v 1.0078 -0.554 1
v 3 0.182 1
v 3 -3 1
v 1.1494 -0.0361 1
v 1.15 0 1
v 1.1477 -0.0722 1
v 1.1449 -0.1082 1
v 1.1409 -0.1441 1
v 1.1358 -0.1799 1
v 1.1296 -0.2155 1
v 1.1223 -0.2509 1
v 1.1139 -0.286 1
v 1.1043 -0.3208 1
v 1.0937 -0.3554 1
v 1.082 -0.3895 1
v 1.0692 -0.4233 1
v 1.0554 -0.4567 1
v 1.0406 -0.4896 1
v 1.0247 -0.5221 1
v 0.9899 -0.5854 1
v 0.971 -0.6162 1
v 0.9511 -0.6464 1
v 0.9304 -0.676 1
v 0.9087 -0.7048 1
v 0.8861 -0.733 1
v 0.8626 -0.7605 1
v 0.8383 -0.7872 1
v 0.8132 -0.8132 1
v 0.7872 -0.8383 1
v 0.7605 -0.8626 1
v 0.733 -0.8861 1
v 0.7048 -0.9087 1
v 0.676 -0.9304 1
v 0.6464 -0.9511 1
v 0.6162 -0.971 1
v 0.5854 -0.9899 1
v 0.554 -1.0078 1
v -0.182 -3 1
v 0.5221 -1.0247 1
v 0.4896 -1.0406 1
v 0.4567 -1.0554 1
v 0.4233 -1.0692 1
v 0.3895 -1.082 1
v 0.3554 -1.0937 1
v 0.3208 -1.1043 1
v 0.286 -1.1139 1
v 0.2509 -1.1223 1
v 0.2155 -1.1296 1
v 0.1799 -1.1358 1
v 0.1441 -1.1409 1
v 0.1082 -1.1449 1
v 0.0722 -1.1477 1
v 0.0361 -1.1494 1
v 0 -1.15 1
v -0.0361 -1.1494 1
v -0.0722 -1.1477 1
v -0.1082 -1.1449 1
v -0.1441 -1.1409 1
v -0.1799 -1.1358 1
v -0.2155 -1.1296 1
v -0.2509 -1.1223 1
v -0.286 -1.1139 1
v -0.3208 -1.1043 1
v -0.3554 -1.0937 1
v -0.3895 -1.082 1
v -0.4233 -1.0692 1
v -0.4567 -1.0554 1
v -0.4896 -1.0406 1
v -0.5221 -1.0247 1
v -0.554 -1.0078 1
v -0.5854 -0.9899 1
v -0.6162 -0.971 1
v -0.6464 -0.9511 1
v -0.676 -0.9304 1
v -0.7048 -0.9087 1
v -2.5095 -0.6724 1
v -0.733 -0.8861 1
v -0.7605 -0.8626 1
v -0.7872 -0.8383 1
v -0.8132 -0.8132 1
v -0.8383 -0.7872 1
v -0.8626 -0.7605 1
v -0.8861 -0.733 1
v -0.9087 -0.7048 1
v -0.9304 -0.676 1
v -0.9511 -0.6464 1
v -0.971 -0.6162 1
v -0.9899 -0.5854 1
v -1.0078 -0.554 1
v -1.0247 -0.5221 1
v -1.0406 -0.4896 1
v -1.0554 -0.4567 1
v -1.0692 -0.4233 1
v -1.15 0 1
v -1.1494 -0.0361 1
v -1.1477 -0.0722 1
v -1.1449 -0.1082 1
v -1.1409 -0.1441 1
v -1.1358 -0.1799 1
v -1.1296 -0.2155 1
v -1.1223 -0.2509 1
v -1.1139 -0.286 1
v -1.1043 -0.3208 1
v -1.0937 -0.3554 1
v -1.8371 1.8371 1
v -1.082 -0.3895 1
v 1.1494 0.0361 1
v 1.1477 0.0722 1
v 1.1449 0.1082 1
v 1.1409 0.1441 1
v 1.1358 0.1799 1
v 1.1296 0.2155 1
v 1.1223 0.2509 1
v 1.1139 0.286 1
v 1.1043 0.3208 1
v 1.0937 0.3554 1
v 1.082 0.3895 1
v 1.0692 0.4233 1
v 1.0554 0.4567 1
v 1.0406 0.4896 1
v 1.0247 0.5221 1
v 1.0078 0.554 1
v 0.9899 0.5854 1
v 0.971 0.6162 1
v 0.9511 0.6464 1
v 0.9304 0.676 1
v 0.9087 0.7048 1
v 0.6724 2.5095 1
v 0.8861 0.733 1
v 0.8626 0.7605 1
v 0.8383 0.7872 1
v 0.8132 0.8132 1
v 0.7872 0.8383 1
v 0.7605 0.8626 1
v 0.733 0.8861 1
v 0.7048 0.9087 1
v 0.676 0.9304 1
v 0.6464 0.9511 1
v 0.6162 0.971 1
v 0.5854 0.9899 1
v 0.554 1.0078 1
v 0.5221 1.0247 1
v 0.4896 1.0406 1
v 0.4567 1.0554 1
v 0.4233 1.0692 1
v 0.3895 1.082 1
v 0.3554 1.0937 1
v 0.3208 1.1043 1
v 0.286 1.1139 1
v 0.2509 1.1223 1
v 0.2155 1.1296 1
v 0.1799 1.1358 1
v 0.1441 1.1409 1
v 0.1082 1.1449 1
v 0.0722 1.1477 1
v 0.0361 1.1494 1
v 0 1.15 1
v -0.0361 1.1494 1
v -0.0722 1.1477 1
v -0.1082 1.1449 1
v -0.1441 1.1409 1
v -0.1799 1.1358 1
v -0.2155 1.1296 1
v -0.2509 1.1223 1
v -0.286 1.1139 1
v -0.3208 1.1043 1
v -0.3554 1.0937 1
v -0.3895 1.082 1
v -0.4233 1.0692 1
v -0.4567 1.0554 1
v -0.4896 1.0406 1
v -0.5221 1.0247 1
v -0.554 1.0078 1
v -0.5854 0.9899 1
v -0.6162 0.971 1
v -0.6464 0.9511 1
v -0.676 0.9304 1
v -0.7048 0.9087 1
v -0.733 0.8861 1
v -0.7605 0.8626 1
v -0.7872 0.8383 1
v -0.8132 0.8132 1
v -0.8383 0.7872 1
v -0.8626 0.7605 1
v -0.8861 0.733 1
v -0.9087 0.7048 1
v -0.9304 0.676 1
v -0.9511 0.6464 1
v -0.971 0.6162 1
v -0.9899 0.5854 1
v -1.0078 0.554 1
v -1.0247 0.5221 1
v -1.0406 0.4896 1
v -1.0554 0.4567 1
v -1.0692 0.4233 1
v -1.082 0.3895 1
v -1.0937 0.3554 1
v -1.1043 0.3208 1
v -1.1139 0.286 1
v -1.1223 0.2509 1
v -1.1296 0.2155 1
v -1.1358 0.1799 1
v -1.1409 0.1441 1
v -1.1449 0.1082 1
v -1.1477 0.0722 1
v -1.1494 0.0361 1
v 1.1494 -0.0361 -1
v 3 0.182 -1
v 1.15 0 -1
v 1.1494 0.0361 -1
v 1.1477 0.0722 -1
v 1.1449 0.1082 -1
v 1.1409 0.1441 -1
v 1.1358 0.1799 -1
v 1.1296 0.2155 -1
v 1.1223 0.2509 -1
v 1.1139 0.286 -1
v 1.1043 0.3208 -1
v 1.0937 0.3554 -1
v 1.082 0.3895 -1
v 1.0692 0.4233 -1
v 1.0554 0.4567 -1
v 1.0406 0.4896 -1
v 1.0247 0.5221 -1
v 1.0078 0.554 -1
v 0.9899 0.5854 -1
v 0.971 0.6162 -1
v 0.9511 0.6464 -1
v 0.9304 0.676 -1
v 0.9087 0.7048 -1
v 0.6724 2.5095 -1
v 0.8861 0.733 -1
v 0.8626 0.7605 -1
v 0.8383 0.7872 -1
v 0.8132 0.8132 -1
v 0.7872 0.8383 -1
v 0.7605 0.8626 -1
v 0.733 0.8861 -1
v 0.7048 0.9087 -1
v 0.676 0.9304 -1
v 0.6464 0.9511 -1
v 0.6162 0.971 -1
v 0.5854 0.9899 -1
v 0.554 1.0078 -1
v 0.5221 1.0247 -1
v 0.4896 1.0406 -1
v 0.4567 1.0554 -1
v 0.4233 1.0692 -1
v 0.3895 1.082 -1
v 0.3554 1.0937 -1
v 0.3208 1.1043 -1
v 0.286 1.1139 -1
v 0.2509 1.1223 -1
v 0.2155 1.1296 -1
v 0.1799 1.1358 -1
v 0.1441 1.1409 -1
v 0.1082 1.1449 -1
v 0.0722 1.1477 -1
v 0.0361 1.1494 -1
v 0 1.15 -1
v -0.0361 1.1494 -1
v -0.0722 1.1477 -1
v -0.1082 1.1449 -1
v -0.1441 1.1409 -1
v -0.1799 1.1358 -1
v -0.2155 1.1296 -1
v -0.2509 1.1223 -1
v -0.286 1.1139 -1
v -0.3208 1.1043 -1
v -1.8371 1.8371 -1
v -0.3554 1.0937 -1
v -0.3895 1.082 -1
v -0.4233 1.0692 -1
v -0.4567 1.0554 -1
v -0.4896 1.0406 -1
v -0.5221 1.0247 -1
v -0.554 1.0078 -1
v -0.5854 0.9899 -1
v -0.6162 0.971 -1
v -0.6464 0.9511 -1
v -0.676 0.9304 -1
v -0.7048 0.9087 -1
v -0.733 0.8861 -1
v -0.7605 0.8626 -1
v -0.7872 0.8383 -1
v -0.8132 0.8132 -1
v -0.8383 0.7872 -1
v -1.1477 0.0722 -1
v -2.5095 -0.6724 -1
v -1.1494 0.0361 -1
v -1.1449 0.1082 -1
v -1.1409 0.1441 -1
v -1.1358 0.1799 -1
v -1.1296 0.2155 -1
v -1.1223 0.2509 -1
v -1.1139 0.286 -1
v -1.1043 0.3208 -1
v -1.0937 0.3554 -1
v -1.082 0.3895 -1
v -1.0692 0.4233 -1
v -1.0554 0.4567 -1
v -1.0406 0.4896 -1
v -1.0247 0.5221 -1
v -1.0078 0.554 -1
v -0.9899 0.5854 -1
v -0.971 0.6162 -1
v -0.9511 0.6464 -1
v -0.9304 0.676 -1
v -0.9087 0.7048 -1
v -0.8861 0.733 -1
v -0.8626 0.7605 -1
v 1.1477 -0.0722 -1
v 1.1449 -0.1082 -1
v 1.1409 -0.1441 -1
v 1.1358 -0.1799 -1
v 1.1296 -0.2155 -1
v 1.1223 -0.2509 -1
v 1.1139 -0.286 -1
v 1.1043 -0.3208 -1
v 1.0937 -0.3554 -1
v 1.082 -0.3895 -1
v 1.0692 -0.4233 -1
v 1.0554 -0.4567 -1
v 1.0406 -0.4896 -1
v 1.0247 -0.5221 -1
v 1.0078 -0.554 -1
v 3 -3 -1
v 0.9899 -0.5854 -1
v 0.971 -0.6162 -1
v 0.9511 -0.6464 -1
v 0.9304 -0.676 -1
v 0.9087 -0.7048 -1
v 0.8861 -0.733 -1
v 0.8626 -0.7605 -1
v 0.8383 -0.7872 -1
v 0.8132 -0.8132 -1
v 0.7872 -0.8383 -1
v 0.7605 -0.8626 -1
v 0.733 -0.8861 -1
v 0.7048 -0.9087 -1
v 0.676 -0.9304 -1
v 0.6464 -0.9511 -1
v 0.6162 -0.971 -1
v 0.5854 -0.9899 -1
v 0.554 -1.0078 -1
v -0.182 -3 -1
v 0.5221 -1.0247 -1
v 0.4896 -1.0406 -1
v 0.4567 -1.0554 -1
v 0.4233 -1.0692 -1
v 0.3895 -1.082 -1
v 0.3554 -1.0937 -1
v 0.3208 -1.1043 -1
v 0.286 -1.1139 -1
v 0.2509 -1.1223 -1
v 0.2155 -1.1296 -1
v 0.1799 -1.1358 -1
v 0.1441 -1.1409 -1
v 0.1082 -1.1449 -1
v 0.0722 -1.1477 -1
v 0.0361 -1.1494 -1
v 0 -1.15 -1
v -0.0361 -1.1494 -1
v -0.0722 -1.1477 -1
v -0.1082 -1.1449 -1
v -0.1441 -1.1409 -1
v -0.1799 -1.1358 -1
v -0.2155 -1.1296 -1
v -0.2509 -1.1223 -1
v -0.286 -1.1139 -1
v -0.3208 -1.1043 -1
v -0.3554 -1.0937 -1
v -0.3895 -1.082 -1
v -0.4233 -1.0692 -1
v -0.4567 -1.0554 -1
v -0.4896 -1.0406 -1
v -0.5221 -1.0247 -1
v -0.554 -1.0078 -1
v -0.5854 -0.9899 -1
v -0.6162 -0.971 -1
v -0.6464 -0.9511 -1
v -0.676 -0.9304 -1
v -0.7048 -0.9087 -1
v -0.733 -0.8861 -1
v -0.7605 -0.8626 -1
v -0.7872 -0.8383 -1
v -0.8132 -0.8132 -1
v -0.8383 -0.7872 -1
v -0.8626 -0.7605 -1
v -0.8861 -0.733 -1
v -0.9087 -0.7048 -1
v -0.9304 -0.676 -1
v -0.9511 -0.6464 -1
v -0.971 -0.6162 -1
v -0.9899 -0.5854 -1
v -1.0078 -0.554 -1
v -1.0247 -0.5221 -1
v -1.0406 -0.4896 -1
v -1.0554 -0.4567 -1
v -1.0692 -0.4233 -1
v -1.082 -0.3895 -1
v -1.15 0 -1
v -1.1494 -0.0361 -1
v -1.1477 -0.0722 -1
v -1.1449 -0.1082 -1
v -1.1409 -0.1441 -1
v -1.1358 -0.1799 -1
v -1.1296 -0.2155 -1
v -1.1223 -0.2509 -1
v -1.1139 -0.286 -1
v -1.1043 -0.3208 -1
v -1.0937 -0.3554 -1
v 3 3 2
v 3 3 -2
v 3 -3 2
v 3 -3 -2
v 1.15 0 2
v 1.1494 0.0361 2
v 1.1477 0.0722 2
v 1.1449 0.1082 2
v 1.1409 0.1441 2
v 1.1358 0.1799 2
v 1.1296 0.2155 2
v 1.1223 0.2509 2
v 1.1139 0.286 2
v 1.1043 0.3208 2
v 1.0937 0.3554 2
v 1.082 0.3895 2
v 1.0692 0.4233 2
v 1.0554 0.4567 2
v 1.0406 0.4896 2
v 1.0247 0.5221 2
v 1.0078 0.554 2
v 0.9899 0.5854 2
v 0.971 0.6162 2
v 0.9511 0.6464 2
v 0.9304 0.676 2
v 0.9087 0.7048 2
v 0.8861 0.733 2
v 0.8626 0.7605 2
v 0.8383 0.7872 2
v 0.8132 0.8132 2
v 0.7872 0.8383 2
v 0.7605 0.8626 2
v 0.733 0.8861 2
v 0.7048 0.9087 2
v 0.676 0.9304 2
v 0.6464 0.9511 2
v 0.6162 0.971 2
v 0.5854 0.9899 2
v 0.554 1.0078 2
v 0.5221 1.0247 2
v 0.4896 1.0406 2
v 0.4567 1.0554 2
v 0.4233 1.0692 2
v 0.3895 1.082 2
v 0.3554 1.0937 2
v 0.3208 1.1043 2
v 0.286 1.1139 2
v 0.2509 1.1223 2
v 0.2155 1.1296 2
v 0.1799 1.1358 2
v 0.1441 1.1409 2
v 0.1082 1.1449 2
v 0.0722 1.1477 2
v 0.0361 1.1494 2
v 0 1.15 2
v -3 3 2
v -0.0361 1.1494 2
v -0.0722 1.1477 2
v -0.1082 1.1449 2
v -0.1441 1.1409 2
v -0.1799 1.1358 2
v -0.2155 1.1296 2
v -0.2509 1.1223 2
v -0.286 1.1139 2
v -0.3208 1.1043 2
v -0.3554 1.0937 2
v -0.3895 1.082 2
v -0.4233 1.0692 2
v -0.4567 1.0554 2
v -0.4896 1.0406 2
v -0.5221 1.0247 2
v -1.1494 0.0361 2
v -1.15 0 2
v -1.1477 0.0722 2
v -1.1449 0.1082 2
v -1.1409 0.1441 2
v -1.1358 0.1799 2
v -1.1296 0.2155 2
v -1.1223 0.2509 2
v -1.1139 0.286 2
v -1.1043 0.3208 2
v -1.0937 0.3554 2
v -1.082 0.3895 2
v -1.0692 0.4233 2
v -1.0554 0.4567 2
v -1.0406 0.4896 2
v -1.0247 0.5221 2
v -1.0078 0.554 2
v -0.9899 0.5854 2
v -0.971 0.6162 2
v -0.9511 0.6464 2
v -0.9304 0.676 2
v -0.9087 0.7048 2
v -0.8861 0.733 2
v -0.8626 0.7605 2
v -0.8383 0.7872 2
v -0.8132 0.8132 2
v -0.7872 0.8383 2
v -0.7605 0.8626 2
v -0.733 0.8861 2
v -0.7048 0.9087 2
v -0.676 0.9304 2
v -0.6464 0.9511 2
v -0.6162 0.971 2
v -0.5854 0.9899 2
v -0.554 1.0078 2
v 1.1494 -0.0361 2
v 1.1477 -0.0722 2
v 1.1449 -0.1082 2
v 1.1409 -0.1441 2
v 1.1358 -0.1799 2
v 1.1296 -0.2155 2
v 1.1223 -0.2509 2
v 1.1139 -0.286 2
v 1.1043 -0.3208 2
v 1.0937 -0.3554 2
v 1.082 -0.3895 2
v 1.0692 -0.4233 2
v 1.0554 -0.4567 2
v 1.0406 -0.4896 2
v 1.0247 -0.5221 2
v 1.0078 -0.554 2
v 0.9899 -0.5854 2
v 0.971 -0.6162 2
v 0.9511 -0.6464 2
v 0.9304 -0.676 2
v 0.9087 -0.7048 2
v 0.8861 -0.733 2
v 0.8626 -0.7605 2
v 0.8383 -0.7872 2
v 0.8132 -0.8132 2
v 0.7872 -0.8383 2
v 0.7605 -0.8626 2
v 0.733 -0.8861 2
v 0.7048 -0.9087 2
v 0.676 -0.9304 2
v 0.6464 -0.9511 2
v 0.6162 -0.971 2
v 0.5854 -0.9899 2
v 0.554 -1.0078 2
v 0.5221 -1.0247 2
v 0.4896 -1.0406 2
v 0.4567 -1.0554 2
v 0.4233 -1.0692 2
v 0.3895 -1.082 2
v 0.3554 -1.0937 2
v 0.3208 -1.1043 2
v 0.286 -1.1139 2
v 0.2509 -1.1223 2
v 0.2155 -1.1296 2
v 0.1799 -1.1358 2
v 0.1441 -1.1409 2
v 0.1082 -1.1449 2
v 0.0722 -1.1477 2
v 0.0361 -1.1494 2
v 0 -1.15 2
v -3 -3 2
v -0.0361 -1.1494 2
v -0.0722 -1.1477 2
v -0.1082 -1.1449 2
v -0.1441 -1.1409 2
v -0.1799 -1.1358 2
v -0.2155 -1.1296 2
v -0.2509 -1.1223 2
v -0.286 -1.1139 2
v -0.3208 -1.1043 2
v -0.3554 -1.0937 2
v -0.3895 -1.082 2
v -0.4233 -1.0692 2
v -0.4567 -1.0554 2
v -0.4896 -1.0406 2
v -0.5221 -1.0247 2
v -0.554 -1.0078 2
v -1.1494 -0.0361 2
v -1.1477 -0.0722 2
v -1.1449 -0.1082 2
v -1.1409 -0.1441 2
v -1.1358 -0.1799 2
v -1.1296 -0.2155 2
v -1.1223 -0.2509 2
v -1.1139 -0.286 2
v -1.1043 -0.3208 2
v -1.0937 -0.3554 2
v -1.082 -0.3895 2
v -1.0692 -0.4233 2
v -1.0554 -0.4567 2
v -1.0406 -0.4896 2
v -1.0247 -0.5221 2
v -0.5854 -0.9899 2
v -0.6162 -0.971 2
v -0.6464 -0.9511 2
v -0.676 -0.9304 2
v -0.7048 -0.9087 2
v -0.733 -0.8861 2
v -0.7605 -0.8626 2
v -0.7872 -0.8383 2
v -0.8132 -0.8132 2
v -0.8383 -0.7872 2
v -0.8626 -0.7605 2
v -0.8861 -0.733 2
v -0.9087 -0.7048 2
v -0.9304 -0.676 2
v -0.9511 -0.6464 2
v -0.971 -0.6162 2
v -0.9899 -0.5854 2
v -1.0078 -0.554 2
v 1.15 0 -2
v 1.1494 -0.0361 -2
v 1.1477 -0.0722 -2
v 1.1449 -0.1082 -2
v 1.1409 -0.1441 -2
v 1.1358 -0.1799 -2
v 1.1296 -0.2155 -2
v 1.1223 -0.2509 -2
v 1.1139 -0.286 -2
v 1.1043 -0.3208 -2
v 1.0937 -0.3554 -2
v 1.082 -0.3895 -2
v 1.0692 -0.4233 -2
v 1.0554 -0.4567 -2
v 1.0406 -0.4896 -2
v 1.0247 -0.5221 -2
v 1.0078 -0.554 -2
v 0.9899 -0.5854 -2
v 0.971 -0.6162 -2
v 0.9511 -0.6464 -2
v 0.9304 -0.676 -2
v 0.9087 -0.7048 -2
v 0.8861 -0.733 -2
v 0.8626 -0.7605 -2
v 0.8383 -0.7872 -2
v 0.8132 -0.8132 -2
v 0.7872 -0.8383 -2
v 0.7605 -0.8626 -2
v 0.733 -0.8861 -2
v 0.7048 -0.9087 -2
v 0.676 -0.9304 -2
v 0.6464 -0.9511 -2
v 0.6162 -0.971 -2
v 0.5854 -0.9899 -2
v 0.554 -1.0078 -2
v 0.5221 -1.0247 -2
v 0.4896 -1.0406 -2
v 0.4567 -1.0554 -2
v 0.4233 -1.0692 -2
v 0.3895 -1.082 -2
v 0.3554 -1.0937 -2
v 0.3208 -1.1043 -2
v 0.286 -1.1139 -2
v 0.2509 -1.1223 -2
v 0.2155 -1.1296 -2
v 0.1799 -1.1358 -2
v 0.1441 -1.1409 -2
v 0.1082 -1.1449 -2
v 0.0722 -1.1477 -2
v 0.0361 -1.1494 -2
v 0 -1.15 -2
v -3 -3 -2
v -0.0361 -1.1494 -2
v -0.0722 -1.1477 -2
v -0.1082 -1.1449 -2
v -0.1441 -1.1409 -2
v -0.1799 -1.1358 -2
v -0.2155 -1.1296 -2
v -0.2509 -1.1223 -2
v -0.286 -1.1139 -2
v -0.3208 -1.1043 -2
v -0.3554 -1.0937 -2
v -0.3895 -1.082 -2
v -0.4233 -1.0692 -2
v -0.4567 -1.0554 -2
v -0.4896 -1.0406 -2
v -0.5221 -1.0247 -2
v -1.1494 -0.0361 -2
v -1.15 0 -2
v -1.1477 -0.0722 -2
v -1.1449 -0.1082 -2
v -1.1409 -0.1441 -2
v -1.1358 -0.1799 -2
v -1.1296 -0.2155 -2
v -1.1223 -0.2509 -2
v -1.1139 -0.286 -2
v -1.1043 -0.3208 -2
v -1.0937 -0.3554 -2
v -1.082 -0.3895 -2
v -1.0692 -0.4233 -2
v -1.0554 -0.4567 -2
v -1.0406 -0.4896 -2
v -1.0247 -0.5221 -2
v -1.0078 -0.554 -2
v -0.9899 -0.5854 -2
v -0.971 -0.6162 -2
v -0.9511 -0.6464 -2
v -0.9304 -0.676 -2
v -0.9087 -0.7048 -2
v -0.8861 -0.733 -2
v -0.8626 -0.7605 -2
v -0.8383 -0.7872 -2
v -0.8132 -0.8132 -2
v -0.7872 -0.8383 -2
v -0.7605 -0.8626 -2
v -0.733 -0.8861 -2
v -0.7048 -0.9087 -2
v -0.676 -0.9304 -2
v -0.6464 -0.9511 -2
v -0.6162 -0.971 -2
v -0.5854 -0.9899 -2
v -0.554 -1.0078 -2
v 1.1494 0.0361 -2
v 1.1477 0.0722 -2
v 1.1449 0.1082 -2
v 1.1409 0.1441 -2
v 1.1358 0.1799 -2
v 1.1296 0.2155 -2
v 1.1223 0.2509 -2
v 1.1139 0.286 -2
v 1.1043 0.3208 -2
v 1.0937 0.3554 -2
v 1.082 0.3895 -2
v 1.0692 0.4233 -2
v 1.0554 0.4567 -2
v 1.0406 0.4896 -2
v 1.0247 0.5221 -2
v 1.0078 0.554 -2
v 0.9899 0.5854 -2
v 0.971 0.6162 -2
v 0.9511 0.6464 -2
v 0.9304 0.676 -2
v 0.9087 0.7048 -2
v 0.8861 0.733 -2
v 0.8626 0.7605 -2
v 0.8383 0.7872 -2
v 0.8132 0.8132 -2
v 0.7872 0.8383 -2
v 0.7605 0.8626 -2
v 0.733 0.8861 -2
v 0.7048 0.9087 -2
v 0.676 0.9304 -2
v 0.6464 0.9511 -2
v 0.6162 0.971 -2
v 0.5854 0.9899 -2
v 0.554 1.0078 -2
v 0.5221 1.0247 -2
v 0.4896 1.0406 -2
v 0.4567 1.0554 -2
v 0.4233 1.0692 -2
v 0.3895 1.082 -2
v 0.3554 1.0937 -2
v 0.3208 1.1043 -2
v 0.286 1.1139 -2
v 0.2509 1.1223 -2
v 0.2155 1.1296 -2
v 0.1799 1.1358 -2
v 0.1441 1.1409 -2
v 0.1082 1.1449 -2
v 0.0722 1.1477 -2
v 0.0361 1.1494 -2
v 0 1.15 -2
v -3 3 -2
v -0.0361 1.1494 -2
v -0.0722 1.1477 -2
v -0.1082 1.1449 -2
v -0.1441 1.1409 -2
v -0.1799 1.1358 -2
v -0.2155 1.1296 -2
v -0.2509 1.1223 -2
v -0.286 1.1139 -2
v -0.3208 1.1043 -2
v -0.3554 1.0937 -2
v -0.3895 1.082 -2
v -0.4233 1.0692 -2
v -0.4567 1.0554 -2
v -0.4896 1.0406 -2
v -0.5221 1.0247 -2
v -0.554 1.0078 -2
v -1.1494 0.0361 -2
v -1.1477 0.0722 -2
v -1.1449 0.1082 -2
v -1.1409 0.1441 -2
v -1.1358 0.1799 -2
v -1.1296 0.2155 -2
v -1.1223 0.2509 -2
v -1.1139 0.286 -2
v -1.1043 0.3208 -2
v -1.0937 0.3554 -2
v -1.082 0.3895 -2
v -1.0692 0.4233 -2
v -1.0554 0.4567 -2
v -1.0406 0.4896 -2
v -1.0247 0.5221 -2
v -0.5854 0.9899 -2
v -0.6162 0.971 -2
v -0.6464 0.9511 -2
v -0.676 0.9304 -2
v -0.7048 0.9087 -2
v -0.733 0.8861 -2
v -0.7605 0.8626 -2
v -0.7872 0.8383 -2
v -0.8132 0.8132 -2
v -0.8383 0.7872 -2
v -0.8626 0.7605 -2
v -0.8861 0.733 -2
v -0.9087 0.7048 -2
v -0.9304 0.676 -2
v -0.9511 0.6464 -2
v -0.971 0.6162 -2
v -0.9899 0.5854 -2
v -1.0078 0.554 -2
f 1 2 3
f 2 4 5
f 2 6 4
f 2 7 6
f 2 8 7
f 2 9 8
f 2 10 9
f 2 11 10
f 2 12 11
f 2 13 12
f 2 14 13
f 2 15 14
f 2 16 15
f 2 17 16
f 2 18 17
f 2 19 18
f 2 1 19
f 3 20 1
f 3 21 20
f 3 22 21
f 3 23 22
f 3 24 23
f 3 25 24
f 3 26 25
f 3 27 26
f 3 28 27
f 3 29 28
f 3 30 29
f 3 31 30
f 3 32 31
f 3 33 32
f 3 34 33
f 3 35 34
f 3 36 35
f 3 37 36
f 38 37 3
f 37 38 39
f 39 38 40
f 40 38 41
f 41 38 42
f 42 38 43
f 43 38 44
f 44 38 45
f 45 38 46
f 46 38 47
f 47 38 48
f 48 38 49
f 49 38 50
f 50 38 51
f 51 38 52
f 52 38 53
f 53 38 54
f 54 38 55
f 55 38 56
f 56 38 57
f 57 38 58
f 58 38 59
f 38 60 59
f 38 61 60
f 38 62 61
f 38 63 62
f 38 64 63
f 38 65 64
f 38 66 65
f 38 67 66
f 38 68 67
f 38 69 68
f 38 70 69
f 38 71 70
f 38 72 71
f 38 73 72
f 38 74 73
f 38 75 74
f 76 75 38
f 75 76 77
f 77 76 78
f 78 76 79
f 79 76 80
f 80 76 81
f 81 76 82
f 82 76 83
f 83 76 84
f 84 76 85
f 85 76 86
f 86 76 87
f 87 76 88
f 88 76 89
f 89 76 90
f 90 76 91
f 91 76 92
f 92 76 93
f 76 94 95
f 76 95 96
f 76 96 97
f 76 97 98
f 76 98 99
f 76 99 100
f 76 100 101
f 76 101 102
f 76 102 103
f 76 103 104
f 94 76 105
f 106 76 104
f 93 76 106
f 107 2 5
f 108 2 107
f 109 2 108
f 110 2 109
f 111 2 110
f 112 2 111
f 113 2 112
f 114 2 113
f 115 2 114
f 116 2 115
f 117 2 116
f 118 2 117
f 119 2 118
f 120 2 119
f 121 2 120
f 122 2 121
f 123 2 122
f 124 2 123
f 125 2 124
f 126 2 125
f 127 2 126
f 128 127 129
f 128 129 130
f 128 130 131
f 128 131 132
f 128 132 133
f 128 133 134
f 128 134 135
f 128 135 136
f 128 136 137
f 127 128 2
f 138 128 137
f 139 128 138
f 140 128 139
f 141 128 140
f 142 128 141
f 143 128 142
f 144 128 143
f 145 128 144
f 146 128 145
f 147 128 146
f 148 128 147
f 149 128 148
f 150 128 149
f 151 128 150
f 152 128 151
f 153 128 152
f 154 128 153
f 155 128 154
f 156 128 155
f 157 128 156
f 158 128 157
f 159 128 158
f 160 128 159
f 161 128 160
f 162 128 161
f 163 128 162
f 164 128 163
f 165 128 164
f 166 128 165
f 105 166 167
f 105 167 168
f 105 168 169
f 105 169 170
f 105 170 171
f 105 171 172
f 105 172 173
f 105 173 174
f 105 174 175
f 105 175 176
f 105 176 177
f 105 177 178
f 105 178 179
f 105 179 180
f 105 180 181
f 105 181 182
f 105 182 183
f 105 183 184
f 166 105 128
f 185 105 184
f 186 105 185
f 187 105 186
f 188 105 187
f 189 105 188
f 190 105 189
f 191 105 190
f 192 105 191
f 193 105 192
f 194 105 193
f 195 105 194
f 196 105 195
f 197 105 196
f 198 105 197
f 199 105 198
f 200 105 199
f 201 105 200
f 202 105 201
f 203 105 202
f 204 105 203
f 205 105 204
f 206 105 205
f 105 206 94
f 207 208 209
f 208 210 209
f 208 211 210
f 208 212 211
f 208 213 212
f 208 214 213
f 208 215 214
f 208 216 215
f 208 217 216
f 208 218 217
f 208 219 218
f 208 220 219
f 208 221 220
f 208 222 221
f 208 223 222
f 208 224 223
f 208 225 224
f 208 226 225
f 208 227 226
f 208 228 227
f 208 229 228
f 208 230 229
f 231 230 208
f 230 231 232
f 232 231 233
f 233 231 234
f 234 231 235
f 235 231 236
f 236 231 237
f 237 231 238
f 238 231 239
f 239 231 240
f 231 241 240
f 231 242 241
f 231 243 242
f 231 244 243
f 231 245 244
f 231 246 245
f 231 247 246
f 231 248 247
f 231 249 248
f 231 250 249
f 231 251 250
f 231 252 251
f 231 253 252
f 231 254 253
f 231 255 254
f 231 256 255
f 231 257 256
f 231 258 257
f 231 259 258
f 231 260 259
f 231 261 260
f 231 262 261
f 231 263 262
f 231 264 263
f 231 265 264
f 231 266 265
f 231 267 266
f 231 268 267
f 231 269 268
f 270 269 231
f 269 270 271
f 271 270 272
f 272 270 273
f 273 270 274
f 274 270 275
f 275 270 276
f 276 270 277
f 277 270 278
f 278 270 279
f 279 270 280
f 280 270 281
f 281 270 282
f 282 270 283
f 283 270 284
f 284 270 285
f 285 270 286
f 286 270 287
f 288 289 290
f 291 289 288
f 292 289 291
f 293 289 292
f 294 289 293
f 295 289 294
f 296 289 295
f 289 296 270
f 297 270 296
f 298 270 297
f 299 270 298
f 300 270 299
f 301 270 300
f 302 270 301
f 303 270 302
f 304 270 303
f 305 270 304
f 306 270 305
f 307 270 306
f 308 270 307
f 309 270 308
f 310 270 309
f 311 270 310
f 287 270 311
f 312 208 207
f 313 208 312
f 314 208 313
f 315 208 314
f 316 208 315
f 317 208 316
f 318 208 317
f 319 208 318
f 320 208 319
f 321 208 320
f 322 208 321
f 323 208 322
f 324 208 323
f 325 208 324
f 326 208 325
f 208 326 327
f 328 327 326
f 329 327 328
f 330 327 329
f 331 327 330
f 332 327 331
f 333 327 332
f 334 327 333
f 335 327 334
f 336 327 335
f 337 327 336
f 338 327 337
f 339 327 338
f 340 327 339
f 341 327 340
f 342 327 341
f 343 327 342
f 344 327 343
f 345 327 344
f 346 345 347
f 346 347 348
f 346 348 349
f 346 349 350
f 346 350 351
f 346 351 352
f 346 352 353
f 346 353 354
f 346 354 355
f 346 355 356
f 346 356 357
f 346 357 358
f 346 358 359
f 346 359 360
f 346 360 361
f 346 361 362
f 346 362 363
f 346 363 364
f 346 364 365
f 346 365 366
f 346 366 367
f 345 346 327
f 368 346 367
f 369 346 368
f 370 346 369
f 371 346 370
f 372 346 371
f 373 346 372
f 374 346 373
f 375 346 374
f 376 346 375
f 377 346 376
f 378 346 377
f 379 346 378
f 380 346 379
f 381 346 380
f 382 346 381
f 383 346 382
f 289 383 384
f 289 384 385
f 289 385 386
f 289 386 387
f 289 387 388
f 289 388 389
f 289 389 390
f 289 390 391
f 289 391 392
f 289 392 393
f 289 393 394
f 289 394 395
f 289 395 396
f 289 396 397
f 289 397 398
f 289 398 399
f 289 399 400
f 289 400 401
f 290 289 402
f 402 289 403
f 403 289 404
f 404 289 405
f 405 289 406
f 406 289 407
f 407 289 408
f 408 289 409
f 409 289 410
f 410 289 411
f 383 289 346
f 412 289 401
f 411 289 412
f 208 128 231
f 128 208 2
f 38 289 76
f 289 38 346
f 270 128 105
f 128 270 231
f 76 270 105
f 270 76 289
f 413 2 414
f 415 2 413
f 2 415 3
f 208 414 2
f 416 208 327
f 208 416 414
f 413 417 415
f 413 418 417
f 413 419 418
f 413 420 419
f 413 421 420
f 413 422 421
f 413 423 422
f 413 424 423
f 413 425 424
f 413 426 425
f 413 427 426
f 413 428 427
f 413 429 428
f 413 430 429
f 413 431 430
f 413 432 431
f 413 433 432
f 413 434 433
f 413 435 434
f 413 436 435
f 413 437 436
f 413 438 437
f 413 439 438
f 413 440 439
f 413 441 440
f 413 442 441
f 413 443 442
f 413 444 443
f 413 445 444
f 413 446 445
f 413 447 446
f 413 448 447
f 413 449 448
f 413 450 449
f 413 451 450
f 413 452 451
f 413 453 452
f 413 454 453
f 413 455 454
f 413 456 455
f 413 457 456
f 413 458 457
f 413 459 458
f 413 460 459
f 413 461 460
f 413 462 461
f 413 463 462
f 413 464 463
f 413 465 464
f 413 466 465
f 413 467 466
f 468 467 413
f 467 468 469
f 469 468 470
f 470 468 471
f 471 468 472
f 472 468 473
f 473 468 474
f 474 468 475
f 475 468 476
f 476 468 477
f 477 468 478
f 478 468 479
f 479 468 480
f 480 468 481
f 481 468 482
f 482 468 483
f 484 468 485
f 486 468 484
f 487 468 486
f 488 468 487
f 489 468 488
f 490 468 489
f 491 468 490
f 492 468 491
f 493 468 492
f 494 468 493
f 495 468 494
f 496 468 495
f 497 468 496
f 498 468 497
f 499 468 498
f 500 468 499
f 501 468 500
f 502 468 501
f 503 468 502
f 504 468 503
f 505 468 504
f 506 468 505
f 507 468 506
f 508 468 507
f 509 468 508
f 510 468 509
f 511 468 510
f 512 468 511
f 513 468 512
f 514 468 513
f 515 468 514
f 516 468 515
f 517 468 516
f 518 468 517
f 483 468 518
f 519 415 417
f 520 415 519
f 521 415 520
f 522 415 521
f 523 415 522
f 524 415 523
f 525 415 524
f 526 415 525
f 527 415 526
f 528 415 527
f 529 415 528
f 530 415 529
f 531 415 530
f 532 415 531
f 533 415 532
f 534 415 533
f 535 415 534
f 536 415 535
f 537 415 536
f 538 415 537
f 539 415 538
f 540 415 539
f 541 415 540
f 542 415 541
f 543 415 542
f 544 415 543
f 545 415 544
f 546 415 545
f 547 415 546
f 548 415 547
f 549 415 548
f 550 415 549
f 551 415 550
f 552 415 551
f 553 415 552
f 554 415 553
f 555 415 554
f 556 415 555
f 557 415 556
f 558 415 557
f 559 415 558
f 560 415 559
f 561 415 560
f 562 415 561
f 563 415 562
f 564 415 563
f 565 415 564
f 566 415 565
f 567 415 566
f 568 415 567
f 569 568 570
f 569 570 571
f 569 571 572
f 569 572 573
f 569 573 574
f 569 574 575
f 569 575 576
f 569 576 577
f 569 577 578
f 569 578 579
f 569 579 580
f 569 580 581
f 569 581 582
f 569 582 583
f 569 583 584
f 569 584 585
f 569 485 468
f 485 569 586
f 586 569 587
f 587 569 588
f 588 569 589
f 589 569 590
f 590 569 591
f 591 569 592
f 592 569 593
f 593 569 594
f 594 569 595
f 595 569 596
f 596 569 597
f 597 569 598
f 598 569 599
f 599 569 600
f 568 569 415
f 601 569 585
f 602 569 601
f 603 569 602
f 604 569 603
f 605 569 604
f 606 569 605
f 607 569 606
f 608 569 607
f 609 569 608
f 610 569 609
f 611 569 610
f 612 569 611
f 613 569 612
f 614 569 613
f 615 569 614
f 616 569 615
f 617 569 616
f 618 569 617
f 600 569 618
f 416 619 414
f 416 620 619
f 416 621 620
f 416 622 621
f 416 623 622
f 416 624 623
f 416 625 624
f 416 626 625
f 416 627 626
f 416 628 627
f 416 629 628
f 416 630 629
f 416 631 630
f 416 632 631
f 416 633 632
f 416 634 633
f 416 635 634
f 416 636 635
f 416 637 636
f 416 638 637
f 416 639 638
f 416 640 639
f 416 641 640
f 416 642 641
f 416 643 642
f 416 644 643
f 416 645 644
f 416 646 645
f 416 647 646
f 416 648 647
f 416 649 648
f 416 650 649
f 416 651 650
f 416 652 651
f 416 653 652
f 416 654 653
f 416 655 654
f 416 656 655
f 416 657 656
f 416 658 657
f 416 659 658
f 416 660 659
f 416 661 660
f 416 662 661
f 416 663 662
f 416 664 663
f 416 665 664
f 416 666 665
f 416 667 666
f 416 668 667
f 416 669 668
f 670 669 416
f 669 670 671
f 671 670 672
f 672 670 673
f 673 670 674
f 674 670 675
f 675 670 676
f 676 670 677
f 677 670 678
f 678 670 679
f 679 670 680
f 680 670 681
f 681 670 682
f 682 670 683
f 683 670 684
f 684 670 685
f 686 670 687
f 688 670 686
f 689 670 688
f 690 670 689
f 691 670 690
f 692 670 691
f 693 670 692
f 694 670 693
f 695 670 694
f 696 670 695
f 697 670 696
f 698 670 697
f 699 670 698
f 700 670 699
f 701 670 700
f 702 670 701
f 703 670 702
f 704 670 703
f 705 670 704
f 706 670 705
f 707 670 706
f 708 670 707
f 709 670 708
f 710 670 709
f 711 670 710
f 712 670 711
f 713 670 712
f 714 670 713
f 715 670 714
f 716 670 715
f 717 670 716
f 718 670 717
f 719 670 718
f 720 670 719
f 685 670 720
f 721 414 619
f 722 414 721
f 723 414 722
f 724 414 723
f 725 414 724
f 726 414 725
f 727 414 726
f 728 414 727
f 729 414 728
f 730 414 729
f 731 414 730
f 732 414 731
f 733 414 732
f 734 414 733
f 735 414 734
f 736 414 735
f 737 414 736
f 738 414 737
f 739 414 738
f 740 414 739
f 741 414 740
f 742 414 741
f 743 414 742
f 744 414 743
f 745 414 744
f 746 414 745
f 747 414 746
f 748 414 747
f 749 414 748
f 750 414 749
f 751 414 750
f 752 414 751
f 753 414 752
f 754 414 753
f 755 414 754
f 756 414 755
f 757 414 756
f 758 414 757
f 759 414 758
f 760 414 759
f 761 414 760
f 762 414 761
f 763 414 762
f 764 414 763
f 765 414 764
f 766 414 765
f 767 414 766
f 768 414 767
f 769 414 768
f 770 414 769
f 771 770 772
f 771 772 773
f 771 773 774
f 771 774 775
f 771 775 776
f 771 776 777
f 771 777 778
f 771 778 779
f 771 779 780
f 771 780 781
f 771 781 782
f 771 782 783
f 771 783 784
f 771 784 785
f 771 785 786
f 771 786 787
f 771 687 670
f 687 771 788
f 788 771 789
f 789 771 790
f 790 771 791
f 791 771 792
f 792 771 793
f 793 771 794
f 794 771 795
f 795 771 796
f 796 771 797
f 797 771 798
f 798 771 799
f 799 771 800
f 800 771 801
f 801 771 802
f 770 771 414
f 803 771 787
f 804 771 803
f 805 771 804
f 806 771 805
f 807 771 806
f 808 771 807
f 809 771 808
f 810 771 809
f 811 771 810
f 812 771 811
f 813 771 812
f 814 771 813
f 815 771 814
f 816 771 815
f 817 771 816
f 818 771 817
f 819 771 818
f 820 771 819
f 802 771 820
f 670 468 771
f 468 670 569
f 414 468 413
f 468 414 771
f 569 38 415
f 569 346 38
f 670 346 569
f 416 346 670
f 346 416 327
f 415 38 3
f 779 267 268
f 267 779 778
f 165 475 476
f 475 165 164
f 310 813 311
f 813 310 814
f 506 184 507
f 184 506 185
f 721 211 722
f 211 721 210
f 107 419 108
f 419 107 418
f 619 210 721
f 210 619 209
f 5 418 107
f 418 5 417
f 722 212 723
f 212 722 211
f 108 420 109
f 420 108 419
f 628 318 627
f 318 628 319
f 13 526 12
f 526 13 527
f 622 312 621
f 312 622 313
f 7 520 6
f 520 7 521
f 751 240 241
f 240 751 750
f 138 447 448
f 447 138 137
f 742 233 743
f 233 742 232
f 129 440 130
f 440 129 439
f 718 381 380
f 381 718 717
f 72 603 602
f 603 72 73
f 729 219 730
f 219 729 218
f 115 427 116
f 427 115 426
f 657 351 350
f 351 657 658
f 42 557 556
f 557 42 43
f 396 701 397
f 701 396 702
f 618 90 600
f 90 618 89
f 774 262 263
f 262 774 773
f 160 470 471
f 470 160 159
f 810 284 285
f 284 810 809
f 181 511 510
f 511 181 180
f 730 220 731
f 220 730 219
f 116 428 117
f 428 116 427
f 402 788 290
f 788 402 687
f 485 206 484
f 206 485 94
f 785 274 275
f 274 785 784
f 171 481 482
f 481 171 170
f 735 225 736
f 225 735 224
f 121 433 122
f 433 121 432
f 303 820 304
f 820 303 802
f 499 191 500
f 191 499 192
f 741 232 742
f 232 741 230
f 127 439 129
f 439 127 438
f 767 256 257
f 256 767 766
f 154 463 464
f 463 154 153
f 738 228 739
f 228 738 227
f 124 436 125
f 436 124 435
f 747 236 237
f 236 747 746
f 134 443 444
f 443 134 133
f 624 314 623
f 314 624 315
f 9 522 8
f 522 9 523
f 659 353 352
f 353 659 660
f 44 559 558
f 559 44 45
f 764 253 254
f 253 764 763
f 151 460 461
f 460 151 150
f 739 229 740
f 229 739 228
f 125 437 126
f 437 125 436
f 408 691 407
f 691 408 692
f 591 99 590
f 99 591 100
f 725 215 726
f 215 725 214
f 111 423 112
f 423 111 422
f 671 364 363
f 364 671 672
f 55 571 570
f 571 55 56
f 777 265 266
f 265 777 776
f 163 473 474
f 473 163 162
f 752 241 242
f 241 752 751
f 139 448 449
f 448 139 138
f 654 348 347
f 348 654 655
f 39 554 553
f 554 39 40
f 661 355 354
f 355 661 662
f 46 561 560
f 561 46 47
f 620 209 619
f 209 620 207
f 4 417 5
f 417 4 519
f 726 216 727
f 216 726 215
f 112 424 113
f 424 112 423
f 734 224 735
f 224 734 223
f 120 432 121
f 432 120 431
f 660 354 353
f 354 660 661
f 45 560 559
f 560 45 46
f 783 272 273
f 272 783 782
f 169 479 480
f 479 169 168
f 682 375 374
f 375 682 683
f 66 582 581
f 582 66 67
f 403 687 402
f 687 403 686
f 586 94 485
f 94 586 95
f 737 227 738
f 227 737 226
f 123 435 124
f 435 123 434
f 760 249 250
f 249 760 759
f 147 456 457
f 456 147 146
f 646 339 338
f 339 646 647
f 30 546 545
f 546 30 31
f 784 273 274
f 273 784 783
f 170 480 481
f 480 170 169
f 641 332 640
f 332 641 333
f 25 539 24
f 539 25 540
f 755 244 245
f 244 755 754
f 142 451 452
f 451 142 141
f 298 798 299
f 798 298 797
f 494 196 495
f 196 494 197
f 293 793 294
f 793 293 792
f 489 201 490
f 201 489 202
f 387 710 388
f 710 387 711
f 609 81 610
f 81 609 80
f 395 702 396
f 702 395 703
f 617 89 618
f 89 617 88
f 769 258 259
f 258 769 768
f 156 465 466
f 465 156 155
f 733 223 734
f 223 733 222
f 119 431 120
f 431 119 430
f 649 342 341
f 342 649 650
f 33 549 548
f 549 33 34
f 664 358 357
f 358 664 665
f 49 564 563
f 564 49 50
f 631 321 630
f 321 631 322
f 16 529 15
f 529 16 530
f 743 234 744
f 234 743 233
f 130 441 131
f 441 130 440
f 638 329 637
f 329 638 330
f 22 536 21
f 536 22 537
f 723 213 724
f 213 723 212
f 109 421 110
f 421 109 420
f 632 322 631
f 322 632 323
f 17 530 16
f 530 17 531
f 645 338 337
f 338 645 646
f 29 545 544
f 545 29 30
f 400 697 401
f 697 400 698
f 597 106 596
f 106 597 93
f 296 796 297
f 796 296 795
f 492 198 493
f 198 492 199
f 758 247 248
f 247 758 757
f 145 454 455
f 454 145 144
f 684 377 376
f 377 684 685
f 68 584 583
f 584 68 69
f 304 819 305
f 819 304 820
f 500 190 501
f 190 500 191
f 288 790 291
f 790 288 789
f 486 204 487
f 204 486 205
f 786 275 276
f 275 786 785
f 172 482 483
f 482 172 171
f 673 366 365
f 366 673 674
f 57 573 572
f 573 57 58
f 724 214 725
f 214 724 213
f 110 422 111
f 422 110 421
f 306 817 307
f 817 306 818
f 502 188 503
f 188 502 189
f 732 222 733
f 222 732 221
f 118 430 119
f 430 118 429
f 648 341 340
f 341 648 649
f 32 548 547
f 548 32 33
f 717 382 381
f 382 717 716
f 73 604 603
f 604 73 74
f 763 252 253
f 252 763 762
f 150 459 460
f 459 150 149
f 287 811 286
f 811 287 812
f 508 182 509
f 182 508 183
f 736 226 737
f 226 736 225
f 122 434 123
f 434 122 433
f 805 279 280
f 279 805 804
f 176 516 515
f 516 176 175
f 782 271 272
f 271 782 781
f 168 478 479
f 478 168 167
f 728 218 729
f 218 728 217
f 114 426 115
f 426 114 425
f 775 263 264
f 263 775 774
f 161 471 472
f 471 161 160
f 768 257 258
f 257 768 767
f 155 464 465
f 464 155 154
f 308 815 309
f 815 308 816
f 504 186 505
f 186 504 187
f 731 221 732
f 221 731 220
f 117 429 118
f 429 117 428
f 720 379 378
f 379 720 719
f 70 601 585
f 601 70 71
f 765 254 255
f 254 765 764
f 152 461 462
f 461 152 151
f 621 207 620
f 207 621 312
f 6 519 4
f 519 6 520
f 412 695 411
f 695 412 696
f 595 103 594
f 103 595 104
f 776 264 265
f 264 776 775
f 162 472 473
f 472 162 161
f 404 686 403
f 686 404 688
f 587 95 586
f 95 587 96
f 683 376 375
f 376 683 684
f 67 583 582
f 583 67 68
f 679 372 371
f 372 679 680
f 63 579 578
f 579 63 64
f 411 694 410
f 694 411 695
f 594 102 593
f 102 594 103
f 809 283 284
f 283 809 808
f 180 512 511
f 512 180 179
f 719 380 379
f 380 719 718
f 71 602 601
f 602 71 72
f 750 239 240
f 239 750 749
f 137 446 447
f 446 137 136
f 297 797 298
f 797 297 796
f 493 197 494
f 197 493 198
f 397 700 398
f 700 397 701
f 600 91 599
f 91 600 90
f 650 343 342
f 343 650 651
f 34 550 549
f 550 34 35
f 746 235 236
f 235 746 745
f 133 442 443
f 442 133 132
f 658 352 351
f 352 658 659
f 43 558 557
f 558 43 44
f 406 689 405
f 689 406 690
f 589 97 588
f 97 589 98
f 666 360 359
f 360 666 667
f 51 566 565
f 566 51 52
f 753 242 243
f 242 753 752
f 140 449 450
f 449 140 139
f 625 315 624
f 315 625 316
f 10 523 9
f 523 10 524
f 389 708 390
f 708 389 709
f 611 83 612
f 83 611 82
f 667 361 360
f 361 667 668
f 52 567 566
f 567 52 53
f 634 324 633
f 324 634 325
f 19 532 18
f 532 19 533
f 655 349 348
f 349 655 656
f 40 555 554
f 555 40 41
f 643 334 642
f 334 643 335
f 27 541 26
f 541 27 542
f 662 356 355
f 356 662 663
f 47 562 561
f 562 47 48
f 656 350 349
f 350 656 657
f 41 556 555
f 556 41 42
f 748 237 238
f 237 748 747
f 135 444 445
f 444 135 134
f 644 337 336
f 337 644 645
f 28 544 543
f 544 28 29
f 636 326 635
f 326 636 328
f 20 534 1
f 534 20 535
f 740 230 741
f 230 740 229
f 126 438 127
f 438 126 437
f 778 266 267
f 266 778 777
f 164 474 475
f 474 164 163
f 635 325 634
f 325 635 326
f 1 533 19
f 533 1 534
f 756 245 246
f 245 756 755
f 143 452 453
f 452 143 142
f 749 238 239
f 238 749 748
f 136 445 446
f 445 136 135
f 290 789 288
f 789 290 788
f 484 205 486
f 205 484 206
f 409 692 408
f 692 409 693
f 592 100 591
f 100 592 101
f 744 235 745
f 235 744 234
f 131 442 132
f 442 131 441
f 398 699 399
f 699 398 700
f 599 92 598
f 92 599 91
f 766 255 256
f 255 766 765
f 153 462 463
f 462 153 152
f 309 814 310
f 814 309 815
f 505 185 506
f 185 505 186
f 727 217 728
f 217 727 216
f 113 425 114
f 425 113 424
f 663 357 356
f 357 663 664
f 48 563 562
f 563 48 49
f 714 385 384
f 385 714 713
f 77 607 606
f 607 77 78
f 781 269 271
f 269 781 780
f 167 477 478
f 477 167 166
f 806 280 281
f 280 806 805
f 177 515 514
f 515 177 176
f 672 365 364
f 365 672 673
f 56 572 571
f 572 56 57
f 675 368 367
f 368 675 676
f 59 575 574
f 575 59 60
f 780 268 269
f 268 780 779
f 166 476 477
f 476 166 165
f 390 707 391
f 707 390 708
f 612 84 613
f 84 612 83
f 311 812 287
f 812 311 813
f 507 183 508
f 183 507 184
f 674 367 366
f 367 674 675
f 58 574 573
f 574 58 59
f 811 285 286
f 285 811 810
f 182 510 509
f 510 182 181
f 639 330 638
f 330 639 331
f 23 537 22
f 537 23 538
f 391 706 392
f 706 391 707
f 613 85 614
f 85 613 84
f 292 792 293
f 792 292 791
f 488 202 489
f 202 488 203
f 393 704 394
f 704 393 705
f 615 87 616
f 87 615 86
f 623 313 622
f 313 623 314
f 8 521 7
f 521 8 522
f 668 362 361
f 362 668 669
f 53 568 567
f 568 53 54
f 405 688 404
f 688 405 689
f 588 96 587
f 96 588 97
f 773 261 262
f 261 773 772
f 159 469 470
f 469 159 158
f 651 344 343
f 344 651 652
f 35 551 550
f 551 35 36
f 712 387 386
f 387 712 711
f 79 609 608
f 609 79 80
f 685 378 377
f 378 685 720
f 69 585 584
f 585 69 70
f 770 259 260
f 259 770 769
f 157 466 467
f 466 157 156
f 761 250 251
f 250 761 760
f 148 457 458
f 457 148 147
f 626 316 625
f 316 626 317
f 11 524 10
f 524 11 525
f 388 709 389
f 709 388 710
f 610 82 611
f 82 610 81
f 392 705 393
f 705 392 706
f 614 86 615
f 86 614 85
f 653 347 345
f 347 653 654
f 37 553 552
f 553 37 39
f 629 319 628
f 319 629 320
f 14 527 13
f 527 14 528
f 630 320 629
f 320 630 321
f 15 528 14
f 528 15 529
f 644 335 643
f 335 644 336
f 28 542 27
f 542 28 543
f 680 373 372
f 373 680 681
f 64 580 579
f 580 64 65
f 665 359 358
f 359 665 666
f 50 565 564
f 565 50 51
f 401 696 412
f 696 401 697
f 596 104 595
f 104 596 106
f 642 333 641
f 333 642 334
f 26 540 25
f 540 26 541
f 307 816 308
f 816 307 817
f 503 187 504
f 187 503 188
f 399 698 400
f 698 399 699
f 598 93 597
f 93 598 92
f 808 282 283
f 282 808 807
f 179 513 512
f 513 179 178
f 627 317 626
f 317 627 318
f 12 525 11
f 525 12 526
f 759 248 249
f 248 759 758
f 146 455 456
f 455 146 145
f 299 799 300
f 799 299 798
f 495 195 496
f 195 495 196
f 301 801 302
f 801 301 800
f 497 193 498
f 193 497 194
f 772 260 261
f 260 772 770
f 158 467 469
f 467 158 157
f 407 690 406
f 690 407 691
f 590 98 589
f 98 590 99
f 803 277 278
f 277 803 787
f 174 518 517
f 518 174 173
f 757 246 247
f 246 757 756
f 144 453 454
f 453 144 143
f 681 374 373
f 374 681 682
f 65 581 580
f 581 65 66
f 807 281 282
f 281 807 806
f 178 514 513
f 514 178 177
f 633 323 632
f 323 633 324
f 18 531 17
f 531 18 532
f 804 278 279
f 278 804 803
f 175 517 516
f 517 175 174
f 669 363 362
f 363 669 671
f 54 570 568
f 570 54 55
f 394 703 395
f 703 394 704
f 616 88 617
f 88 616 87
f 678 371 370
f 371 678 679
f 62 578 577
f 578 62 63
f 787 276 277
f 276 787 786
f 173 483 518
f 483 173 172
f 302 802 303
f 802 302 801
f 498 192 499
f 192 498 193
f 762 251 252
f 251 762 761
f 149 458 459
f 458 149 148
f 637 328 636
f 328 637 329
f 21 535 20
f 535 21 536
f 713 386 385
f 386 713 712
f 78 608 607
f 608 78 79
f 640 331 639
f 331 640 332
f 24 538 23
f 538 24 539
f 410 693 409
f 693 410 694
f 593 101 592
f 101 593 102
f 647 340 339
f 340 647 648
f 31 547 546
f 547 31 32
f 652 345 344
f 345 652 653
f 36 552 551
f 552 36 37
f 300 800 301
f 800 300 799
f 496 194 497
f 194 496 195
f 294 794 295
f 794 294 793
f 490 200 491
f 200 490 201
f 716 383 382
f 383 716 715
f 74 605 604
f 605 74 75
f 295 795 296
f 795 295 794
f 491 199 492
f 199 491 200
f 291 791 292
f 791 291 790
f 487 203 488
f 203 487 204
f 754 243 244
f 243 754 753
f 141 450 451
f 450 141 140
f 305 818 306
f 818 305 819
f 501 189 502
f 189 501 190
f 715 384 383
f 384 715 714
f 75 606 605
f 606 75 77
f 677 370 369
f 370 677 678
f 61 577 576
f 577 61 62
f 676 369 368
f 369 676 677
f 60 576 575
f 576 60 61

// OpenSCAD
radius = 1.15;
height = 2;
size = 4.5;

module nutholder(radius, size, height) {
    difference() {
        cube([size+1.5, size+1.5, height+2], center = true);

        rotate([0, 0, -45])
        union() {
            translate([size, 0, 0])
                cube([size*2, size, height], center = true);
            inradius = (size/2)/(sqrt(3)/2);
            cylinder(r=inradius, h=height, $fn=6, center = true);
        }
        
        cylinder(r=radius, h=height+3, $fn=200, center = true);
    }
}

nutholder(radius, size, height);
